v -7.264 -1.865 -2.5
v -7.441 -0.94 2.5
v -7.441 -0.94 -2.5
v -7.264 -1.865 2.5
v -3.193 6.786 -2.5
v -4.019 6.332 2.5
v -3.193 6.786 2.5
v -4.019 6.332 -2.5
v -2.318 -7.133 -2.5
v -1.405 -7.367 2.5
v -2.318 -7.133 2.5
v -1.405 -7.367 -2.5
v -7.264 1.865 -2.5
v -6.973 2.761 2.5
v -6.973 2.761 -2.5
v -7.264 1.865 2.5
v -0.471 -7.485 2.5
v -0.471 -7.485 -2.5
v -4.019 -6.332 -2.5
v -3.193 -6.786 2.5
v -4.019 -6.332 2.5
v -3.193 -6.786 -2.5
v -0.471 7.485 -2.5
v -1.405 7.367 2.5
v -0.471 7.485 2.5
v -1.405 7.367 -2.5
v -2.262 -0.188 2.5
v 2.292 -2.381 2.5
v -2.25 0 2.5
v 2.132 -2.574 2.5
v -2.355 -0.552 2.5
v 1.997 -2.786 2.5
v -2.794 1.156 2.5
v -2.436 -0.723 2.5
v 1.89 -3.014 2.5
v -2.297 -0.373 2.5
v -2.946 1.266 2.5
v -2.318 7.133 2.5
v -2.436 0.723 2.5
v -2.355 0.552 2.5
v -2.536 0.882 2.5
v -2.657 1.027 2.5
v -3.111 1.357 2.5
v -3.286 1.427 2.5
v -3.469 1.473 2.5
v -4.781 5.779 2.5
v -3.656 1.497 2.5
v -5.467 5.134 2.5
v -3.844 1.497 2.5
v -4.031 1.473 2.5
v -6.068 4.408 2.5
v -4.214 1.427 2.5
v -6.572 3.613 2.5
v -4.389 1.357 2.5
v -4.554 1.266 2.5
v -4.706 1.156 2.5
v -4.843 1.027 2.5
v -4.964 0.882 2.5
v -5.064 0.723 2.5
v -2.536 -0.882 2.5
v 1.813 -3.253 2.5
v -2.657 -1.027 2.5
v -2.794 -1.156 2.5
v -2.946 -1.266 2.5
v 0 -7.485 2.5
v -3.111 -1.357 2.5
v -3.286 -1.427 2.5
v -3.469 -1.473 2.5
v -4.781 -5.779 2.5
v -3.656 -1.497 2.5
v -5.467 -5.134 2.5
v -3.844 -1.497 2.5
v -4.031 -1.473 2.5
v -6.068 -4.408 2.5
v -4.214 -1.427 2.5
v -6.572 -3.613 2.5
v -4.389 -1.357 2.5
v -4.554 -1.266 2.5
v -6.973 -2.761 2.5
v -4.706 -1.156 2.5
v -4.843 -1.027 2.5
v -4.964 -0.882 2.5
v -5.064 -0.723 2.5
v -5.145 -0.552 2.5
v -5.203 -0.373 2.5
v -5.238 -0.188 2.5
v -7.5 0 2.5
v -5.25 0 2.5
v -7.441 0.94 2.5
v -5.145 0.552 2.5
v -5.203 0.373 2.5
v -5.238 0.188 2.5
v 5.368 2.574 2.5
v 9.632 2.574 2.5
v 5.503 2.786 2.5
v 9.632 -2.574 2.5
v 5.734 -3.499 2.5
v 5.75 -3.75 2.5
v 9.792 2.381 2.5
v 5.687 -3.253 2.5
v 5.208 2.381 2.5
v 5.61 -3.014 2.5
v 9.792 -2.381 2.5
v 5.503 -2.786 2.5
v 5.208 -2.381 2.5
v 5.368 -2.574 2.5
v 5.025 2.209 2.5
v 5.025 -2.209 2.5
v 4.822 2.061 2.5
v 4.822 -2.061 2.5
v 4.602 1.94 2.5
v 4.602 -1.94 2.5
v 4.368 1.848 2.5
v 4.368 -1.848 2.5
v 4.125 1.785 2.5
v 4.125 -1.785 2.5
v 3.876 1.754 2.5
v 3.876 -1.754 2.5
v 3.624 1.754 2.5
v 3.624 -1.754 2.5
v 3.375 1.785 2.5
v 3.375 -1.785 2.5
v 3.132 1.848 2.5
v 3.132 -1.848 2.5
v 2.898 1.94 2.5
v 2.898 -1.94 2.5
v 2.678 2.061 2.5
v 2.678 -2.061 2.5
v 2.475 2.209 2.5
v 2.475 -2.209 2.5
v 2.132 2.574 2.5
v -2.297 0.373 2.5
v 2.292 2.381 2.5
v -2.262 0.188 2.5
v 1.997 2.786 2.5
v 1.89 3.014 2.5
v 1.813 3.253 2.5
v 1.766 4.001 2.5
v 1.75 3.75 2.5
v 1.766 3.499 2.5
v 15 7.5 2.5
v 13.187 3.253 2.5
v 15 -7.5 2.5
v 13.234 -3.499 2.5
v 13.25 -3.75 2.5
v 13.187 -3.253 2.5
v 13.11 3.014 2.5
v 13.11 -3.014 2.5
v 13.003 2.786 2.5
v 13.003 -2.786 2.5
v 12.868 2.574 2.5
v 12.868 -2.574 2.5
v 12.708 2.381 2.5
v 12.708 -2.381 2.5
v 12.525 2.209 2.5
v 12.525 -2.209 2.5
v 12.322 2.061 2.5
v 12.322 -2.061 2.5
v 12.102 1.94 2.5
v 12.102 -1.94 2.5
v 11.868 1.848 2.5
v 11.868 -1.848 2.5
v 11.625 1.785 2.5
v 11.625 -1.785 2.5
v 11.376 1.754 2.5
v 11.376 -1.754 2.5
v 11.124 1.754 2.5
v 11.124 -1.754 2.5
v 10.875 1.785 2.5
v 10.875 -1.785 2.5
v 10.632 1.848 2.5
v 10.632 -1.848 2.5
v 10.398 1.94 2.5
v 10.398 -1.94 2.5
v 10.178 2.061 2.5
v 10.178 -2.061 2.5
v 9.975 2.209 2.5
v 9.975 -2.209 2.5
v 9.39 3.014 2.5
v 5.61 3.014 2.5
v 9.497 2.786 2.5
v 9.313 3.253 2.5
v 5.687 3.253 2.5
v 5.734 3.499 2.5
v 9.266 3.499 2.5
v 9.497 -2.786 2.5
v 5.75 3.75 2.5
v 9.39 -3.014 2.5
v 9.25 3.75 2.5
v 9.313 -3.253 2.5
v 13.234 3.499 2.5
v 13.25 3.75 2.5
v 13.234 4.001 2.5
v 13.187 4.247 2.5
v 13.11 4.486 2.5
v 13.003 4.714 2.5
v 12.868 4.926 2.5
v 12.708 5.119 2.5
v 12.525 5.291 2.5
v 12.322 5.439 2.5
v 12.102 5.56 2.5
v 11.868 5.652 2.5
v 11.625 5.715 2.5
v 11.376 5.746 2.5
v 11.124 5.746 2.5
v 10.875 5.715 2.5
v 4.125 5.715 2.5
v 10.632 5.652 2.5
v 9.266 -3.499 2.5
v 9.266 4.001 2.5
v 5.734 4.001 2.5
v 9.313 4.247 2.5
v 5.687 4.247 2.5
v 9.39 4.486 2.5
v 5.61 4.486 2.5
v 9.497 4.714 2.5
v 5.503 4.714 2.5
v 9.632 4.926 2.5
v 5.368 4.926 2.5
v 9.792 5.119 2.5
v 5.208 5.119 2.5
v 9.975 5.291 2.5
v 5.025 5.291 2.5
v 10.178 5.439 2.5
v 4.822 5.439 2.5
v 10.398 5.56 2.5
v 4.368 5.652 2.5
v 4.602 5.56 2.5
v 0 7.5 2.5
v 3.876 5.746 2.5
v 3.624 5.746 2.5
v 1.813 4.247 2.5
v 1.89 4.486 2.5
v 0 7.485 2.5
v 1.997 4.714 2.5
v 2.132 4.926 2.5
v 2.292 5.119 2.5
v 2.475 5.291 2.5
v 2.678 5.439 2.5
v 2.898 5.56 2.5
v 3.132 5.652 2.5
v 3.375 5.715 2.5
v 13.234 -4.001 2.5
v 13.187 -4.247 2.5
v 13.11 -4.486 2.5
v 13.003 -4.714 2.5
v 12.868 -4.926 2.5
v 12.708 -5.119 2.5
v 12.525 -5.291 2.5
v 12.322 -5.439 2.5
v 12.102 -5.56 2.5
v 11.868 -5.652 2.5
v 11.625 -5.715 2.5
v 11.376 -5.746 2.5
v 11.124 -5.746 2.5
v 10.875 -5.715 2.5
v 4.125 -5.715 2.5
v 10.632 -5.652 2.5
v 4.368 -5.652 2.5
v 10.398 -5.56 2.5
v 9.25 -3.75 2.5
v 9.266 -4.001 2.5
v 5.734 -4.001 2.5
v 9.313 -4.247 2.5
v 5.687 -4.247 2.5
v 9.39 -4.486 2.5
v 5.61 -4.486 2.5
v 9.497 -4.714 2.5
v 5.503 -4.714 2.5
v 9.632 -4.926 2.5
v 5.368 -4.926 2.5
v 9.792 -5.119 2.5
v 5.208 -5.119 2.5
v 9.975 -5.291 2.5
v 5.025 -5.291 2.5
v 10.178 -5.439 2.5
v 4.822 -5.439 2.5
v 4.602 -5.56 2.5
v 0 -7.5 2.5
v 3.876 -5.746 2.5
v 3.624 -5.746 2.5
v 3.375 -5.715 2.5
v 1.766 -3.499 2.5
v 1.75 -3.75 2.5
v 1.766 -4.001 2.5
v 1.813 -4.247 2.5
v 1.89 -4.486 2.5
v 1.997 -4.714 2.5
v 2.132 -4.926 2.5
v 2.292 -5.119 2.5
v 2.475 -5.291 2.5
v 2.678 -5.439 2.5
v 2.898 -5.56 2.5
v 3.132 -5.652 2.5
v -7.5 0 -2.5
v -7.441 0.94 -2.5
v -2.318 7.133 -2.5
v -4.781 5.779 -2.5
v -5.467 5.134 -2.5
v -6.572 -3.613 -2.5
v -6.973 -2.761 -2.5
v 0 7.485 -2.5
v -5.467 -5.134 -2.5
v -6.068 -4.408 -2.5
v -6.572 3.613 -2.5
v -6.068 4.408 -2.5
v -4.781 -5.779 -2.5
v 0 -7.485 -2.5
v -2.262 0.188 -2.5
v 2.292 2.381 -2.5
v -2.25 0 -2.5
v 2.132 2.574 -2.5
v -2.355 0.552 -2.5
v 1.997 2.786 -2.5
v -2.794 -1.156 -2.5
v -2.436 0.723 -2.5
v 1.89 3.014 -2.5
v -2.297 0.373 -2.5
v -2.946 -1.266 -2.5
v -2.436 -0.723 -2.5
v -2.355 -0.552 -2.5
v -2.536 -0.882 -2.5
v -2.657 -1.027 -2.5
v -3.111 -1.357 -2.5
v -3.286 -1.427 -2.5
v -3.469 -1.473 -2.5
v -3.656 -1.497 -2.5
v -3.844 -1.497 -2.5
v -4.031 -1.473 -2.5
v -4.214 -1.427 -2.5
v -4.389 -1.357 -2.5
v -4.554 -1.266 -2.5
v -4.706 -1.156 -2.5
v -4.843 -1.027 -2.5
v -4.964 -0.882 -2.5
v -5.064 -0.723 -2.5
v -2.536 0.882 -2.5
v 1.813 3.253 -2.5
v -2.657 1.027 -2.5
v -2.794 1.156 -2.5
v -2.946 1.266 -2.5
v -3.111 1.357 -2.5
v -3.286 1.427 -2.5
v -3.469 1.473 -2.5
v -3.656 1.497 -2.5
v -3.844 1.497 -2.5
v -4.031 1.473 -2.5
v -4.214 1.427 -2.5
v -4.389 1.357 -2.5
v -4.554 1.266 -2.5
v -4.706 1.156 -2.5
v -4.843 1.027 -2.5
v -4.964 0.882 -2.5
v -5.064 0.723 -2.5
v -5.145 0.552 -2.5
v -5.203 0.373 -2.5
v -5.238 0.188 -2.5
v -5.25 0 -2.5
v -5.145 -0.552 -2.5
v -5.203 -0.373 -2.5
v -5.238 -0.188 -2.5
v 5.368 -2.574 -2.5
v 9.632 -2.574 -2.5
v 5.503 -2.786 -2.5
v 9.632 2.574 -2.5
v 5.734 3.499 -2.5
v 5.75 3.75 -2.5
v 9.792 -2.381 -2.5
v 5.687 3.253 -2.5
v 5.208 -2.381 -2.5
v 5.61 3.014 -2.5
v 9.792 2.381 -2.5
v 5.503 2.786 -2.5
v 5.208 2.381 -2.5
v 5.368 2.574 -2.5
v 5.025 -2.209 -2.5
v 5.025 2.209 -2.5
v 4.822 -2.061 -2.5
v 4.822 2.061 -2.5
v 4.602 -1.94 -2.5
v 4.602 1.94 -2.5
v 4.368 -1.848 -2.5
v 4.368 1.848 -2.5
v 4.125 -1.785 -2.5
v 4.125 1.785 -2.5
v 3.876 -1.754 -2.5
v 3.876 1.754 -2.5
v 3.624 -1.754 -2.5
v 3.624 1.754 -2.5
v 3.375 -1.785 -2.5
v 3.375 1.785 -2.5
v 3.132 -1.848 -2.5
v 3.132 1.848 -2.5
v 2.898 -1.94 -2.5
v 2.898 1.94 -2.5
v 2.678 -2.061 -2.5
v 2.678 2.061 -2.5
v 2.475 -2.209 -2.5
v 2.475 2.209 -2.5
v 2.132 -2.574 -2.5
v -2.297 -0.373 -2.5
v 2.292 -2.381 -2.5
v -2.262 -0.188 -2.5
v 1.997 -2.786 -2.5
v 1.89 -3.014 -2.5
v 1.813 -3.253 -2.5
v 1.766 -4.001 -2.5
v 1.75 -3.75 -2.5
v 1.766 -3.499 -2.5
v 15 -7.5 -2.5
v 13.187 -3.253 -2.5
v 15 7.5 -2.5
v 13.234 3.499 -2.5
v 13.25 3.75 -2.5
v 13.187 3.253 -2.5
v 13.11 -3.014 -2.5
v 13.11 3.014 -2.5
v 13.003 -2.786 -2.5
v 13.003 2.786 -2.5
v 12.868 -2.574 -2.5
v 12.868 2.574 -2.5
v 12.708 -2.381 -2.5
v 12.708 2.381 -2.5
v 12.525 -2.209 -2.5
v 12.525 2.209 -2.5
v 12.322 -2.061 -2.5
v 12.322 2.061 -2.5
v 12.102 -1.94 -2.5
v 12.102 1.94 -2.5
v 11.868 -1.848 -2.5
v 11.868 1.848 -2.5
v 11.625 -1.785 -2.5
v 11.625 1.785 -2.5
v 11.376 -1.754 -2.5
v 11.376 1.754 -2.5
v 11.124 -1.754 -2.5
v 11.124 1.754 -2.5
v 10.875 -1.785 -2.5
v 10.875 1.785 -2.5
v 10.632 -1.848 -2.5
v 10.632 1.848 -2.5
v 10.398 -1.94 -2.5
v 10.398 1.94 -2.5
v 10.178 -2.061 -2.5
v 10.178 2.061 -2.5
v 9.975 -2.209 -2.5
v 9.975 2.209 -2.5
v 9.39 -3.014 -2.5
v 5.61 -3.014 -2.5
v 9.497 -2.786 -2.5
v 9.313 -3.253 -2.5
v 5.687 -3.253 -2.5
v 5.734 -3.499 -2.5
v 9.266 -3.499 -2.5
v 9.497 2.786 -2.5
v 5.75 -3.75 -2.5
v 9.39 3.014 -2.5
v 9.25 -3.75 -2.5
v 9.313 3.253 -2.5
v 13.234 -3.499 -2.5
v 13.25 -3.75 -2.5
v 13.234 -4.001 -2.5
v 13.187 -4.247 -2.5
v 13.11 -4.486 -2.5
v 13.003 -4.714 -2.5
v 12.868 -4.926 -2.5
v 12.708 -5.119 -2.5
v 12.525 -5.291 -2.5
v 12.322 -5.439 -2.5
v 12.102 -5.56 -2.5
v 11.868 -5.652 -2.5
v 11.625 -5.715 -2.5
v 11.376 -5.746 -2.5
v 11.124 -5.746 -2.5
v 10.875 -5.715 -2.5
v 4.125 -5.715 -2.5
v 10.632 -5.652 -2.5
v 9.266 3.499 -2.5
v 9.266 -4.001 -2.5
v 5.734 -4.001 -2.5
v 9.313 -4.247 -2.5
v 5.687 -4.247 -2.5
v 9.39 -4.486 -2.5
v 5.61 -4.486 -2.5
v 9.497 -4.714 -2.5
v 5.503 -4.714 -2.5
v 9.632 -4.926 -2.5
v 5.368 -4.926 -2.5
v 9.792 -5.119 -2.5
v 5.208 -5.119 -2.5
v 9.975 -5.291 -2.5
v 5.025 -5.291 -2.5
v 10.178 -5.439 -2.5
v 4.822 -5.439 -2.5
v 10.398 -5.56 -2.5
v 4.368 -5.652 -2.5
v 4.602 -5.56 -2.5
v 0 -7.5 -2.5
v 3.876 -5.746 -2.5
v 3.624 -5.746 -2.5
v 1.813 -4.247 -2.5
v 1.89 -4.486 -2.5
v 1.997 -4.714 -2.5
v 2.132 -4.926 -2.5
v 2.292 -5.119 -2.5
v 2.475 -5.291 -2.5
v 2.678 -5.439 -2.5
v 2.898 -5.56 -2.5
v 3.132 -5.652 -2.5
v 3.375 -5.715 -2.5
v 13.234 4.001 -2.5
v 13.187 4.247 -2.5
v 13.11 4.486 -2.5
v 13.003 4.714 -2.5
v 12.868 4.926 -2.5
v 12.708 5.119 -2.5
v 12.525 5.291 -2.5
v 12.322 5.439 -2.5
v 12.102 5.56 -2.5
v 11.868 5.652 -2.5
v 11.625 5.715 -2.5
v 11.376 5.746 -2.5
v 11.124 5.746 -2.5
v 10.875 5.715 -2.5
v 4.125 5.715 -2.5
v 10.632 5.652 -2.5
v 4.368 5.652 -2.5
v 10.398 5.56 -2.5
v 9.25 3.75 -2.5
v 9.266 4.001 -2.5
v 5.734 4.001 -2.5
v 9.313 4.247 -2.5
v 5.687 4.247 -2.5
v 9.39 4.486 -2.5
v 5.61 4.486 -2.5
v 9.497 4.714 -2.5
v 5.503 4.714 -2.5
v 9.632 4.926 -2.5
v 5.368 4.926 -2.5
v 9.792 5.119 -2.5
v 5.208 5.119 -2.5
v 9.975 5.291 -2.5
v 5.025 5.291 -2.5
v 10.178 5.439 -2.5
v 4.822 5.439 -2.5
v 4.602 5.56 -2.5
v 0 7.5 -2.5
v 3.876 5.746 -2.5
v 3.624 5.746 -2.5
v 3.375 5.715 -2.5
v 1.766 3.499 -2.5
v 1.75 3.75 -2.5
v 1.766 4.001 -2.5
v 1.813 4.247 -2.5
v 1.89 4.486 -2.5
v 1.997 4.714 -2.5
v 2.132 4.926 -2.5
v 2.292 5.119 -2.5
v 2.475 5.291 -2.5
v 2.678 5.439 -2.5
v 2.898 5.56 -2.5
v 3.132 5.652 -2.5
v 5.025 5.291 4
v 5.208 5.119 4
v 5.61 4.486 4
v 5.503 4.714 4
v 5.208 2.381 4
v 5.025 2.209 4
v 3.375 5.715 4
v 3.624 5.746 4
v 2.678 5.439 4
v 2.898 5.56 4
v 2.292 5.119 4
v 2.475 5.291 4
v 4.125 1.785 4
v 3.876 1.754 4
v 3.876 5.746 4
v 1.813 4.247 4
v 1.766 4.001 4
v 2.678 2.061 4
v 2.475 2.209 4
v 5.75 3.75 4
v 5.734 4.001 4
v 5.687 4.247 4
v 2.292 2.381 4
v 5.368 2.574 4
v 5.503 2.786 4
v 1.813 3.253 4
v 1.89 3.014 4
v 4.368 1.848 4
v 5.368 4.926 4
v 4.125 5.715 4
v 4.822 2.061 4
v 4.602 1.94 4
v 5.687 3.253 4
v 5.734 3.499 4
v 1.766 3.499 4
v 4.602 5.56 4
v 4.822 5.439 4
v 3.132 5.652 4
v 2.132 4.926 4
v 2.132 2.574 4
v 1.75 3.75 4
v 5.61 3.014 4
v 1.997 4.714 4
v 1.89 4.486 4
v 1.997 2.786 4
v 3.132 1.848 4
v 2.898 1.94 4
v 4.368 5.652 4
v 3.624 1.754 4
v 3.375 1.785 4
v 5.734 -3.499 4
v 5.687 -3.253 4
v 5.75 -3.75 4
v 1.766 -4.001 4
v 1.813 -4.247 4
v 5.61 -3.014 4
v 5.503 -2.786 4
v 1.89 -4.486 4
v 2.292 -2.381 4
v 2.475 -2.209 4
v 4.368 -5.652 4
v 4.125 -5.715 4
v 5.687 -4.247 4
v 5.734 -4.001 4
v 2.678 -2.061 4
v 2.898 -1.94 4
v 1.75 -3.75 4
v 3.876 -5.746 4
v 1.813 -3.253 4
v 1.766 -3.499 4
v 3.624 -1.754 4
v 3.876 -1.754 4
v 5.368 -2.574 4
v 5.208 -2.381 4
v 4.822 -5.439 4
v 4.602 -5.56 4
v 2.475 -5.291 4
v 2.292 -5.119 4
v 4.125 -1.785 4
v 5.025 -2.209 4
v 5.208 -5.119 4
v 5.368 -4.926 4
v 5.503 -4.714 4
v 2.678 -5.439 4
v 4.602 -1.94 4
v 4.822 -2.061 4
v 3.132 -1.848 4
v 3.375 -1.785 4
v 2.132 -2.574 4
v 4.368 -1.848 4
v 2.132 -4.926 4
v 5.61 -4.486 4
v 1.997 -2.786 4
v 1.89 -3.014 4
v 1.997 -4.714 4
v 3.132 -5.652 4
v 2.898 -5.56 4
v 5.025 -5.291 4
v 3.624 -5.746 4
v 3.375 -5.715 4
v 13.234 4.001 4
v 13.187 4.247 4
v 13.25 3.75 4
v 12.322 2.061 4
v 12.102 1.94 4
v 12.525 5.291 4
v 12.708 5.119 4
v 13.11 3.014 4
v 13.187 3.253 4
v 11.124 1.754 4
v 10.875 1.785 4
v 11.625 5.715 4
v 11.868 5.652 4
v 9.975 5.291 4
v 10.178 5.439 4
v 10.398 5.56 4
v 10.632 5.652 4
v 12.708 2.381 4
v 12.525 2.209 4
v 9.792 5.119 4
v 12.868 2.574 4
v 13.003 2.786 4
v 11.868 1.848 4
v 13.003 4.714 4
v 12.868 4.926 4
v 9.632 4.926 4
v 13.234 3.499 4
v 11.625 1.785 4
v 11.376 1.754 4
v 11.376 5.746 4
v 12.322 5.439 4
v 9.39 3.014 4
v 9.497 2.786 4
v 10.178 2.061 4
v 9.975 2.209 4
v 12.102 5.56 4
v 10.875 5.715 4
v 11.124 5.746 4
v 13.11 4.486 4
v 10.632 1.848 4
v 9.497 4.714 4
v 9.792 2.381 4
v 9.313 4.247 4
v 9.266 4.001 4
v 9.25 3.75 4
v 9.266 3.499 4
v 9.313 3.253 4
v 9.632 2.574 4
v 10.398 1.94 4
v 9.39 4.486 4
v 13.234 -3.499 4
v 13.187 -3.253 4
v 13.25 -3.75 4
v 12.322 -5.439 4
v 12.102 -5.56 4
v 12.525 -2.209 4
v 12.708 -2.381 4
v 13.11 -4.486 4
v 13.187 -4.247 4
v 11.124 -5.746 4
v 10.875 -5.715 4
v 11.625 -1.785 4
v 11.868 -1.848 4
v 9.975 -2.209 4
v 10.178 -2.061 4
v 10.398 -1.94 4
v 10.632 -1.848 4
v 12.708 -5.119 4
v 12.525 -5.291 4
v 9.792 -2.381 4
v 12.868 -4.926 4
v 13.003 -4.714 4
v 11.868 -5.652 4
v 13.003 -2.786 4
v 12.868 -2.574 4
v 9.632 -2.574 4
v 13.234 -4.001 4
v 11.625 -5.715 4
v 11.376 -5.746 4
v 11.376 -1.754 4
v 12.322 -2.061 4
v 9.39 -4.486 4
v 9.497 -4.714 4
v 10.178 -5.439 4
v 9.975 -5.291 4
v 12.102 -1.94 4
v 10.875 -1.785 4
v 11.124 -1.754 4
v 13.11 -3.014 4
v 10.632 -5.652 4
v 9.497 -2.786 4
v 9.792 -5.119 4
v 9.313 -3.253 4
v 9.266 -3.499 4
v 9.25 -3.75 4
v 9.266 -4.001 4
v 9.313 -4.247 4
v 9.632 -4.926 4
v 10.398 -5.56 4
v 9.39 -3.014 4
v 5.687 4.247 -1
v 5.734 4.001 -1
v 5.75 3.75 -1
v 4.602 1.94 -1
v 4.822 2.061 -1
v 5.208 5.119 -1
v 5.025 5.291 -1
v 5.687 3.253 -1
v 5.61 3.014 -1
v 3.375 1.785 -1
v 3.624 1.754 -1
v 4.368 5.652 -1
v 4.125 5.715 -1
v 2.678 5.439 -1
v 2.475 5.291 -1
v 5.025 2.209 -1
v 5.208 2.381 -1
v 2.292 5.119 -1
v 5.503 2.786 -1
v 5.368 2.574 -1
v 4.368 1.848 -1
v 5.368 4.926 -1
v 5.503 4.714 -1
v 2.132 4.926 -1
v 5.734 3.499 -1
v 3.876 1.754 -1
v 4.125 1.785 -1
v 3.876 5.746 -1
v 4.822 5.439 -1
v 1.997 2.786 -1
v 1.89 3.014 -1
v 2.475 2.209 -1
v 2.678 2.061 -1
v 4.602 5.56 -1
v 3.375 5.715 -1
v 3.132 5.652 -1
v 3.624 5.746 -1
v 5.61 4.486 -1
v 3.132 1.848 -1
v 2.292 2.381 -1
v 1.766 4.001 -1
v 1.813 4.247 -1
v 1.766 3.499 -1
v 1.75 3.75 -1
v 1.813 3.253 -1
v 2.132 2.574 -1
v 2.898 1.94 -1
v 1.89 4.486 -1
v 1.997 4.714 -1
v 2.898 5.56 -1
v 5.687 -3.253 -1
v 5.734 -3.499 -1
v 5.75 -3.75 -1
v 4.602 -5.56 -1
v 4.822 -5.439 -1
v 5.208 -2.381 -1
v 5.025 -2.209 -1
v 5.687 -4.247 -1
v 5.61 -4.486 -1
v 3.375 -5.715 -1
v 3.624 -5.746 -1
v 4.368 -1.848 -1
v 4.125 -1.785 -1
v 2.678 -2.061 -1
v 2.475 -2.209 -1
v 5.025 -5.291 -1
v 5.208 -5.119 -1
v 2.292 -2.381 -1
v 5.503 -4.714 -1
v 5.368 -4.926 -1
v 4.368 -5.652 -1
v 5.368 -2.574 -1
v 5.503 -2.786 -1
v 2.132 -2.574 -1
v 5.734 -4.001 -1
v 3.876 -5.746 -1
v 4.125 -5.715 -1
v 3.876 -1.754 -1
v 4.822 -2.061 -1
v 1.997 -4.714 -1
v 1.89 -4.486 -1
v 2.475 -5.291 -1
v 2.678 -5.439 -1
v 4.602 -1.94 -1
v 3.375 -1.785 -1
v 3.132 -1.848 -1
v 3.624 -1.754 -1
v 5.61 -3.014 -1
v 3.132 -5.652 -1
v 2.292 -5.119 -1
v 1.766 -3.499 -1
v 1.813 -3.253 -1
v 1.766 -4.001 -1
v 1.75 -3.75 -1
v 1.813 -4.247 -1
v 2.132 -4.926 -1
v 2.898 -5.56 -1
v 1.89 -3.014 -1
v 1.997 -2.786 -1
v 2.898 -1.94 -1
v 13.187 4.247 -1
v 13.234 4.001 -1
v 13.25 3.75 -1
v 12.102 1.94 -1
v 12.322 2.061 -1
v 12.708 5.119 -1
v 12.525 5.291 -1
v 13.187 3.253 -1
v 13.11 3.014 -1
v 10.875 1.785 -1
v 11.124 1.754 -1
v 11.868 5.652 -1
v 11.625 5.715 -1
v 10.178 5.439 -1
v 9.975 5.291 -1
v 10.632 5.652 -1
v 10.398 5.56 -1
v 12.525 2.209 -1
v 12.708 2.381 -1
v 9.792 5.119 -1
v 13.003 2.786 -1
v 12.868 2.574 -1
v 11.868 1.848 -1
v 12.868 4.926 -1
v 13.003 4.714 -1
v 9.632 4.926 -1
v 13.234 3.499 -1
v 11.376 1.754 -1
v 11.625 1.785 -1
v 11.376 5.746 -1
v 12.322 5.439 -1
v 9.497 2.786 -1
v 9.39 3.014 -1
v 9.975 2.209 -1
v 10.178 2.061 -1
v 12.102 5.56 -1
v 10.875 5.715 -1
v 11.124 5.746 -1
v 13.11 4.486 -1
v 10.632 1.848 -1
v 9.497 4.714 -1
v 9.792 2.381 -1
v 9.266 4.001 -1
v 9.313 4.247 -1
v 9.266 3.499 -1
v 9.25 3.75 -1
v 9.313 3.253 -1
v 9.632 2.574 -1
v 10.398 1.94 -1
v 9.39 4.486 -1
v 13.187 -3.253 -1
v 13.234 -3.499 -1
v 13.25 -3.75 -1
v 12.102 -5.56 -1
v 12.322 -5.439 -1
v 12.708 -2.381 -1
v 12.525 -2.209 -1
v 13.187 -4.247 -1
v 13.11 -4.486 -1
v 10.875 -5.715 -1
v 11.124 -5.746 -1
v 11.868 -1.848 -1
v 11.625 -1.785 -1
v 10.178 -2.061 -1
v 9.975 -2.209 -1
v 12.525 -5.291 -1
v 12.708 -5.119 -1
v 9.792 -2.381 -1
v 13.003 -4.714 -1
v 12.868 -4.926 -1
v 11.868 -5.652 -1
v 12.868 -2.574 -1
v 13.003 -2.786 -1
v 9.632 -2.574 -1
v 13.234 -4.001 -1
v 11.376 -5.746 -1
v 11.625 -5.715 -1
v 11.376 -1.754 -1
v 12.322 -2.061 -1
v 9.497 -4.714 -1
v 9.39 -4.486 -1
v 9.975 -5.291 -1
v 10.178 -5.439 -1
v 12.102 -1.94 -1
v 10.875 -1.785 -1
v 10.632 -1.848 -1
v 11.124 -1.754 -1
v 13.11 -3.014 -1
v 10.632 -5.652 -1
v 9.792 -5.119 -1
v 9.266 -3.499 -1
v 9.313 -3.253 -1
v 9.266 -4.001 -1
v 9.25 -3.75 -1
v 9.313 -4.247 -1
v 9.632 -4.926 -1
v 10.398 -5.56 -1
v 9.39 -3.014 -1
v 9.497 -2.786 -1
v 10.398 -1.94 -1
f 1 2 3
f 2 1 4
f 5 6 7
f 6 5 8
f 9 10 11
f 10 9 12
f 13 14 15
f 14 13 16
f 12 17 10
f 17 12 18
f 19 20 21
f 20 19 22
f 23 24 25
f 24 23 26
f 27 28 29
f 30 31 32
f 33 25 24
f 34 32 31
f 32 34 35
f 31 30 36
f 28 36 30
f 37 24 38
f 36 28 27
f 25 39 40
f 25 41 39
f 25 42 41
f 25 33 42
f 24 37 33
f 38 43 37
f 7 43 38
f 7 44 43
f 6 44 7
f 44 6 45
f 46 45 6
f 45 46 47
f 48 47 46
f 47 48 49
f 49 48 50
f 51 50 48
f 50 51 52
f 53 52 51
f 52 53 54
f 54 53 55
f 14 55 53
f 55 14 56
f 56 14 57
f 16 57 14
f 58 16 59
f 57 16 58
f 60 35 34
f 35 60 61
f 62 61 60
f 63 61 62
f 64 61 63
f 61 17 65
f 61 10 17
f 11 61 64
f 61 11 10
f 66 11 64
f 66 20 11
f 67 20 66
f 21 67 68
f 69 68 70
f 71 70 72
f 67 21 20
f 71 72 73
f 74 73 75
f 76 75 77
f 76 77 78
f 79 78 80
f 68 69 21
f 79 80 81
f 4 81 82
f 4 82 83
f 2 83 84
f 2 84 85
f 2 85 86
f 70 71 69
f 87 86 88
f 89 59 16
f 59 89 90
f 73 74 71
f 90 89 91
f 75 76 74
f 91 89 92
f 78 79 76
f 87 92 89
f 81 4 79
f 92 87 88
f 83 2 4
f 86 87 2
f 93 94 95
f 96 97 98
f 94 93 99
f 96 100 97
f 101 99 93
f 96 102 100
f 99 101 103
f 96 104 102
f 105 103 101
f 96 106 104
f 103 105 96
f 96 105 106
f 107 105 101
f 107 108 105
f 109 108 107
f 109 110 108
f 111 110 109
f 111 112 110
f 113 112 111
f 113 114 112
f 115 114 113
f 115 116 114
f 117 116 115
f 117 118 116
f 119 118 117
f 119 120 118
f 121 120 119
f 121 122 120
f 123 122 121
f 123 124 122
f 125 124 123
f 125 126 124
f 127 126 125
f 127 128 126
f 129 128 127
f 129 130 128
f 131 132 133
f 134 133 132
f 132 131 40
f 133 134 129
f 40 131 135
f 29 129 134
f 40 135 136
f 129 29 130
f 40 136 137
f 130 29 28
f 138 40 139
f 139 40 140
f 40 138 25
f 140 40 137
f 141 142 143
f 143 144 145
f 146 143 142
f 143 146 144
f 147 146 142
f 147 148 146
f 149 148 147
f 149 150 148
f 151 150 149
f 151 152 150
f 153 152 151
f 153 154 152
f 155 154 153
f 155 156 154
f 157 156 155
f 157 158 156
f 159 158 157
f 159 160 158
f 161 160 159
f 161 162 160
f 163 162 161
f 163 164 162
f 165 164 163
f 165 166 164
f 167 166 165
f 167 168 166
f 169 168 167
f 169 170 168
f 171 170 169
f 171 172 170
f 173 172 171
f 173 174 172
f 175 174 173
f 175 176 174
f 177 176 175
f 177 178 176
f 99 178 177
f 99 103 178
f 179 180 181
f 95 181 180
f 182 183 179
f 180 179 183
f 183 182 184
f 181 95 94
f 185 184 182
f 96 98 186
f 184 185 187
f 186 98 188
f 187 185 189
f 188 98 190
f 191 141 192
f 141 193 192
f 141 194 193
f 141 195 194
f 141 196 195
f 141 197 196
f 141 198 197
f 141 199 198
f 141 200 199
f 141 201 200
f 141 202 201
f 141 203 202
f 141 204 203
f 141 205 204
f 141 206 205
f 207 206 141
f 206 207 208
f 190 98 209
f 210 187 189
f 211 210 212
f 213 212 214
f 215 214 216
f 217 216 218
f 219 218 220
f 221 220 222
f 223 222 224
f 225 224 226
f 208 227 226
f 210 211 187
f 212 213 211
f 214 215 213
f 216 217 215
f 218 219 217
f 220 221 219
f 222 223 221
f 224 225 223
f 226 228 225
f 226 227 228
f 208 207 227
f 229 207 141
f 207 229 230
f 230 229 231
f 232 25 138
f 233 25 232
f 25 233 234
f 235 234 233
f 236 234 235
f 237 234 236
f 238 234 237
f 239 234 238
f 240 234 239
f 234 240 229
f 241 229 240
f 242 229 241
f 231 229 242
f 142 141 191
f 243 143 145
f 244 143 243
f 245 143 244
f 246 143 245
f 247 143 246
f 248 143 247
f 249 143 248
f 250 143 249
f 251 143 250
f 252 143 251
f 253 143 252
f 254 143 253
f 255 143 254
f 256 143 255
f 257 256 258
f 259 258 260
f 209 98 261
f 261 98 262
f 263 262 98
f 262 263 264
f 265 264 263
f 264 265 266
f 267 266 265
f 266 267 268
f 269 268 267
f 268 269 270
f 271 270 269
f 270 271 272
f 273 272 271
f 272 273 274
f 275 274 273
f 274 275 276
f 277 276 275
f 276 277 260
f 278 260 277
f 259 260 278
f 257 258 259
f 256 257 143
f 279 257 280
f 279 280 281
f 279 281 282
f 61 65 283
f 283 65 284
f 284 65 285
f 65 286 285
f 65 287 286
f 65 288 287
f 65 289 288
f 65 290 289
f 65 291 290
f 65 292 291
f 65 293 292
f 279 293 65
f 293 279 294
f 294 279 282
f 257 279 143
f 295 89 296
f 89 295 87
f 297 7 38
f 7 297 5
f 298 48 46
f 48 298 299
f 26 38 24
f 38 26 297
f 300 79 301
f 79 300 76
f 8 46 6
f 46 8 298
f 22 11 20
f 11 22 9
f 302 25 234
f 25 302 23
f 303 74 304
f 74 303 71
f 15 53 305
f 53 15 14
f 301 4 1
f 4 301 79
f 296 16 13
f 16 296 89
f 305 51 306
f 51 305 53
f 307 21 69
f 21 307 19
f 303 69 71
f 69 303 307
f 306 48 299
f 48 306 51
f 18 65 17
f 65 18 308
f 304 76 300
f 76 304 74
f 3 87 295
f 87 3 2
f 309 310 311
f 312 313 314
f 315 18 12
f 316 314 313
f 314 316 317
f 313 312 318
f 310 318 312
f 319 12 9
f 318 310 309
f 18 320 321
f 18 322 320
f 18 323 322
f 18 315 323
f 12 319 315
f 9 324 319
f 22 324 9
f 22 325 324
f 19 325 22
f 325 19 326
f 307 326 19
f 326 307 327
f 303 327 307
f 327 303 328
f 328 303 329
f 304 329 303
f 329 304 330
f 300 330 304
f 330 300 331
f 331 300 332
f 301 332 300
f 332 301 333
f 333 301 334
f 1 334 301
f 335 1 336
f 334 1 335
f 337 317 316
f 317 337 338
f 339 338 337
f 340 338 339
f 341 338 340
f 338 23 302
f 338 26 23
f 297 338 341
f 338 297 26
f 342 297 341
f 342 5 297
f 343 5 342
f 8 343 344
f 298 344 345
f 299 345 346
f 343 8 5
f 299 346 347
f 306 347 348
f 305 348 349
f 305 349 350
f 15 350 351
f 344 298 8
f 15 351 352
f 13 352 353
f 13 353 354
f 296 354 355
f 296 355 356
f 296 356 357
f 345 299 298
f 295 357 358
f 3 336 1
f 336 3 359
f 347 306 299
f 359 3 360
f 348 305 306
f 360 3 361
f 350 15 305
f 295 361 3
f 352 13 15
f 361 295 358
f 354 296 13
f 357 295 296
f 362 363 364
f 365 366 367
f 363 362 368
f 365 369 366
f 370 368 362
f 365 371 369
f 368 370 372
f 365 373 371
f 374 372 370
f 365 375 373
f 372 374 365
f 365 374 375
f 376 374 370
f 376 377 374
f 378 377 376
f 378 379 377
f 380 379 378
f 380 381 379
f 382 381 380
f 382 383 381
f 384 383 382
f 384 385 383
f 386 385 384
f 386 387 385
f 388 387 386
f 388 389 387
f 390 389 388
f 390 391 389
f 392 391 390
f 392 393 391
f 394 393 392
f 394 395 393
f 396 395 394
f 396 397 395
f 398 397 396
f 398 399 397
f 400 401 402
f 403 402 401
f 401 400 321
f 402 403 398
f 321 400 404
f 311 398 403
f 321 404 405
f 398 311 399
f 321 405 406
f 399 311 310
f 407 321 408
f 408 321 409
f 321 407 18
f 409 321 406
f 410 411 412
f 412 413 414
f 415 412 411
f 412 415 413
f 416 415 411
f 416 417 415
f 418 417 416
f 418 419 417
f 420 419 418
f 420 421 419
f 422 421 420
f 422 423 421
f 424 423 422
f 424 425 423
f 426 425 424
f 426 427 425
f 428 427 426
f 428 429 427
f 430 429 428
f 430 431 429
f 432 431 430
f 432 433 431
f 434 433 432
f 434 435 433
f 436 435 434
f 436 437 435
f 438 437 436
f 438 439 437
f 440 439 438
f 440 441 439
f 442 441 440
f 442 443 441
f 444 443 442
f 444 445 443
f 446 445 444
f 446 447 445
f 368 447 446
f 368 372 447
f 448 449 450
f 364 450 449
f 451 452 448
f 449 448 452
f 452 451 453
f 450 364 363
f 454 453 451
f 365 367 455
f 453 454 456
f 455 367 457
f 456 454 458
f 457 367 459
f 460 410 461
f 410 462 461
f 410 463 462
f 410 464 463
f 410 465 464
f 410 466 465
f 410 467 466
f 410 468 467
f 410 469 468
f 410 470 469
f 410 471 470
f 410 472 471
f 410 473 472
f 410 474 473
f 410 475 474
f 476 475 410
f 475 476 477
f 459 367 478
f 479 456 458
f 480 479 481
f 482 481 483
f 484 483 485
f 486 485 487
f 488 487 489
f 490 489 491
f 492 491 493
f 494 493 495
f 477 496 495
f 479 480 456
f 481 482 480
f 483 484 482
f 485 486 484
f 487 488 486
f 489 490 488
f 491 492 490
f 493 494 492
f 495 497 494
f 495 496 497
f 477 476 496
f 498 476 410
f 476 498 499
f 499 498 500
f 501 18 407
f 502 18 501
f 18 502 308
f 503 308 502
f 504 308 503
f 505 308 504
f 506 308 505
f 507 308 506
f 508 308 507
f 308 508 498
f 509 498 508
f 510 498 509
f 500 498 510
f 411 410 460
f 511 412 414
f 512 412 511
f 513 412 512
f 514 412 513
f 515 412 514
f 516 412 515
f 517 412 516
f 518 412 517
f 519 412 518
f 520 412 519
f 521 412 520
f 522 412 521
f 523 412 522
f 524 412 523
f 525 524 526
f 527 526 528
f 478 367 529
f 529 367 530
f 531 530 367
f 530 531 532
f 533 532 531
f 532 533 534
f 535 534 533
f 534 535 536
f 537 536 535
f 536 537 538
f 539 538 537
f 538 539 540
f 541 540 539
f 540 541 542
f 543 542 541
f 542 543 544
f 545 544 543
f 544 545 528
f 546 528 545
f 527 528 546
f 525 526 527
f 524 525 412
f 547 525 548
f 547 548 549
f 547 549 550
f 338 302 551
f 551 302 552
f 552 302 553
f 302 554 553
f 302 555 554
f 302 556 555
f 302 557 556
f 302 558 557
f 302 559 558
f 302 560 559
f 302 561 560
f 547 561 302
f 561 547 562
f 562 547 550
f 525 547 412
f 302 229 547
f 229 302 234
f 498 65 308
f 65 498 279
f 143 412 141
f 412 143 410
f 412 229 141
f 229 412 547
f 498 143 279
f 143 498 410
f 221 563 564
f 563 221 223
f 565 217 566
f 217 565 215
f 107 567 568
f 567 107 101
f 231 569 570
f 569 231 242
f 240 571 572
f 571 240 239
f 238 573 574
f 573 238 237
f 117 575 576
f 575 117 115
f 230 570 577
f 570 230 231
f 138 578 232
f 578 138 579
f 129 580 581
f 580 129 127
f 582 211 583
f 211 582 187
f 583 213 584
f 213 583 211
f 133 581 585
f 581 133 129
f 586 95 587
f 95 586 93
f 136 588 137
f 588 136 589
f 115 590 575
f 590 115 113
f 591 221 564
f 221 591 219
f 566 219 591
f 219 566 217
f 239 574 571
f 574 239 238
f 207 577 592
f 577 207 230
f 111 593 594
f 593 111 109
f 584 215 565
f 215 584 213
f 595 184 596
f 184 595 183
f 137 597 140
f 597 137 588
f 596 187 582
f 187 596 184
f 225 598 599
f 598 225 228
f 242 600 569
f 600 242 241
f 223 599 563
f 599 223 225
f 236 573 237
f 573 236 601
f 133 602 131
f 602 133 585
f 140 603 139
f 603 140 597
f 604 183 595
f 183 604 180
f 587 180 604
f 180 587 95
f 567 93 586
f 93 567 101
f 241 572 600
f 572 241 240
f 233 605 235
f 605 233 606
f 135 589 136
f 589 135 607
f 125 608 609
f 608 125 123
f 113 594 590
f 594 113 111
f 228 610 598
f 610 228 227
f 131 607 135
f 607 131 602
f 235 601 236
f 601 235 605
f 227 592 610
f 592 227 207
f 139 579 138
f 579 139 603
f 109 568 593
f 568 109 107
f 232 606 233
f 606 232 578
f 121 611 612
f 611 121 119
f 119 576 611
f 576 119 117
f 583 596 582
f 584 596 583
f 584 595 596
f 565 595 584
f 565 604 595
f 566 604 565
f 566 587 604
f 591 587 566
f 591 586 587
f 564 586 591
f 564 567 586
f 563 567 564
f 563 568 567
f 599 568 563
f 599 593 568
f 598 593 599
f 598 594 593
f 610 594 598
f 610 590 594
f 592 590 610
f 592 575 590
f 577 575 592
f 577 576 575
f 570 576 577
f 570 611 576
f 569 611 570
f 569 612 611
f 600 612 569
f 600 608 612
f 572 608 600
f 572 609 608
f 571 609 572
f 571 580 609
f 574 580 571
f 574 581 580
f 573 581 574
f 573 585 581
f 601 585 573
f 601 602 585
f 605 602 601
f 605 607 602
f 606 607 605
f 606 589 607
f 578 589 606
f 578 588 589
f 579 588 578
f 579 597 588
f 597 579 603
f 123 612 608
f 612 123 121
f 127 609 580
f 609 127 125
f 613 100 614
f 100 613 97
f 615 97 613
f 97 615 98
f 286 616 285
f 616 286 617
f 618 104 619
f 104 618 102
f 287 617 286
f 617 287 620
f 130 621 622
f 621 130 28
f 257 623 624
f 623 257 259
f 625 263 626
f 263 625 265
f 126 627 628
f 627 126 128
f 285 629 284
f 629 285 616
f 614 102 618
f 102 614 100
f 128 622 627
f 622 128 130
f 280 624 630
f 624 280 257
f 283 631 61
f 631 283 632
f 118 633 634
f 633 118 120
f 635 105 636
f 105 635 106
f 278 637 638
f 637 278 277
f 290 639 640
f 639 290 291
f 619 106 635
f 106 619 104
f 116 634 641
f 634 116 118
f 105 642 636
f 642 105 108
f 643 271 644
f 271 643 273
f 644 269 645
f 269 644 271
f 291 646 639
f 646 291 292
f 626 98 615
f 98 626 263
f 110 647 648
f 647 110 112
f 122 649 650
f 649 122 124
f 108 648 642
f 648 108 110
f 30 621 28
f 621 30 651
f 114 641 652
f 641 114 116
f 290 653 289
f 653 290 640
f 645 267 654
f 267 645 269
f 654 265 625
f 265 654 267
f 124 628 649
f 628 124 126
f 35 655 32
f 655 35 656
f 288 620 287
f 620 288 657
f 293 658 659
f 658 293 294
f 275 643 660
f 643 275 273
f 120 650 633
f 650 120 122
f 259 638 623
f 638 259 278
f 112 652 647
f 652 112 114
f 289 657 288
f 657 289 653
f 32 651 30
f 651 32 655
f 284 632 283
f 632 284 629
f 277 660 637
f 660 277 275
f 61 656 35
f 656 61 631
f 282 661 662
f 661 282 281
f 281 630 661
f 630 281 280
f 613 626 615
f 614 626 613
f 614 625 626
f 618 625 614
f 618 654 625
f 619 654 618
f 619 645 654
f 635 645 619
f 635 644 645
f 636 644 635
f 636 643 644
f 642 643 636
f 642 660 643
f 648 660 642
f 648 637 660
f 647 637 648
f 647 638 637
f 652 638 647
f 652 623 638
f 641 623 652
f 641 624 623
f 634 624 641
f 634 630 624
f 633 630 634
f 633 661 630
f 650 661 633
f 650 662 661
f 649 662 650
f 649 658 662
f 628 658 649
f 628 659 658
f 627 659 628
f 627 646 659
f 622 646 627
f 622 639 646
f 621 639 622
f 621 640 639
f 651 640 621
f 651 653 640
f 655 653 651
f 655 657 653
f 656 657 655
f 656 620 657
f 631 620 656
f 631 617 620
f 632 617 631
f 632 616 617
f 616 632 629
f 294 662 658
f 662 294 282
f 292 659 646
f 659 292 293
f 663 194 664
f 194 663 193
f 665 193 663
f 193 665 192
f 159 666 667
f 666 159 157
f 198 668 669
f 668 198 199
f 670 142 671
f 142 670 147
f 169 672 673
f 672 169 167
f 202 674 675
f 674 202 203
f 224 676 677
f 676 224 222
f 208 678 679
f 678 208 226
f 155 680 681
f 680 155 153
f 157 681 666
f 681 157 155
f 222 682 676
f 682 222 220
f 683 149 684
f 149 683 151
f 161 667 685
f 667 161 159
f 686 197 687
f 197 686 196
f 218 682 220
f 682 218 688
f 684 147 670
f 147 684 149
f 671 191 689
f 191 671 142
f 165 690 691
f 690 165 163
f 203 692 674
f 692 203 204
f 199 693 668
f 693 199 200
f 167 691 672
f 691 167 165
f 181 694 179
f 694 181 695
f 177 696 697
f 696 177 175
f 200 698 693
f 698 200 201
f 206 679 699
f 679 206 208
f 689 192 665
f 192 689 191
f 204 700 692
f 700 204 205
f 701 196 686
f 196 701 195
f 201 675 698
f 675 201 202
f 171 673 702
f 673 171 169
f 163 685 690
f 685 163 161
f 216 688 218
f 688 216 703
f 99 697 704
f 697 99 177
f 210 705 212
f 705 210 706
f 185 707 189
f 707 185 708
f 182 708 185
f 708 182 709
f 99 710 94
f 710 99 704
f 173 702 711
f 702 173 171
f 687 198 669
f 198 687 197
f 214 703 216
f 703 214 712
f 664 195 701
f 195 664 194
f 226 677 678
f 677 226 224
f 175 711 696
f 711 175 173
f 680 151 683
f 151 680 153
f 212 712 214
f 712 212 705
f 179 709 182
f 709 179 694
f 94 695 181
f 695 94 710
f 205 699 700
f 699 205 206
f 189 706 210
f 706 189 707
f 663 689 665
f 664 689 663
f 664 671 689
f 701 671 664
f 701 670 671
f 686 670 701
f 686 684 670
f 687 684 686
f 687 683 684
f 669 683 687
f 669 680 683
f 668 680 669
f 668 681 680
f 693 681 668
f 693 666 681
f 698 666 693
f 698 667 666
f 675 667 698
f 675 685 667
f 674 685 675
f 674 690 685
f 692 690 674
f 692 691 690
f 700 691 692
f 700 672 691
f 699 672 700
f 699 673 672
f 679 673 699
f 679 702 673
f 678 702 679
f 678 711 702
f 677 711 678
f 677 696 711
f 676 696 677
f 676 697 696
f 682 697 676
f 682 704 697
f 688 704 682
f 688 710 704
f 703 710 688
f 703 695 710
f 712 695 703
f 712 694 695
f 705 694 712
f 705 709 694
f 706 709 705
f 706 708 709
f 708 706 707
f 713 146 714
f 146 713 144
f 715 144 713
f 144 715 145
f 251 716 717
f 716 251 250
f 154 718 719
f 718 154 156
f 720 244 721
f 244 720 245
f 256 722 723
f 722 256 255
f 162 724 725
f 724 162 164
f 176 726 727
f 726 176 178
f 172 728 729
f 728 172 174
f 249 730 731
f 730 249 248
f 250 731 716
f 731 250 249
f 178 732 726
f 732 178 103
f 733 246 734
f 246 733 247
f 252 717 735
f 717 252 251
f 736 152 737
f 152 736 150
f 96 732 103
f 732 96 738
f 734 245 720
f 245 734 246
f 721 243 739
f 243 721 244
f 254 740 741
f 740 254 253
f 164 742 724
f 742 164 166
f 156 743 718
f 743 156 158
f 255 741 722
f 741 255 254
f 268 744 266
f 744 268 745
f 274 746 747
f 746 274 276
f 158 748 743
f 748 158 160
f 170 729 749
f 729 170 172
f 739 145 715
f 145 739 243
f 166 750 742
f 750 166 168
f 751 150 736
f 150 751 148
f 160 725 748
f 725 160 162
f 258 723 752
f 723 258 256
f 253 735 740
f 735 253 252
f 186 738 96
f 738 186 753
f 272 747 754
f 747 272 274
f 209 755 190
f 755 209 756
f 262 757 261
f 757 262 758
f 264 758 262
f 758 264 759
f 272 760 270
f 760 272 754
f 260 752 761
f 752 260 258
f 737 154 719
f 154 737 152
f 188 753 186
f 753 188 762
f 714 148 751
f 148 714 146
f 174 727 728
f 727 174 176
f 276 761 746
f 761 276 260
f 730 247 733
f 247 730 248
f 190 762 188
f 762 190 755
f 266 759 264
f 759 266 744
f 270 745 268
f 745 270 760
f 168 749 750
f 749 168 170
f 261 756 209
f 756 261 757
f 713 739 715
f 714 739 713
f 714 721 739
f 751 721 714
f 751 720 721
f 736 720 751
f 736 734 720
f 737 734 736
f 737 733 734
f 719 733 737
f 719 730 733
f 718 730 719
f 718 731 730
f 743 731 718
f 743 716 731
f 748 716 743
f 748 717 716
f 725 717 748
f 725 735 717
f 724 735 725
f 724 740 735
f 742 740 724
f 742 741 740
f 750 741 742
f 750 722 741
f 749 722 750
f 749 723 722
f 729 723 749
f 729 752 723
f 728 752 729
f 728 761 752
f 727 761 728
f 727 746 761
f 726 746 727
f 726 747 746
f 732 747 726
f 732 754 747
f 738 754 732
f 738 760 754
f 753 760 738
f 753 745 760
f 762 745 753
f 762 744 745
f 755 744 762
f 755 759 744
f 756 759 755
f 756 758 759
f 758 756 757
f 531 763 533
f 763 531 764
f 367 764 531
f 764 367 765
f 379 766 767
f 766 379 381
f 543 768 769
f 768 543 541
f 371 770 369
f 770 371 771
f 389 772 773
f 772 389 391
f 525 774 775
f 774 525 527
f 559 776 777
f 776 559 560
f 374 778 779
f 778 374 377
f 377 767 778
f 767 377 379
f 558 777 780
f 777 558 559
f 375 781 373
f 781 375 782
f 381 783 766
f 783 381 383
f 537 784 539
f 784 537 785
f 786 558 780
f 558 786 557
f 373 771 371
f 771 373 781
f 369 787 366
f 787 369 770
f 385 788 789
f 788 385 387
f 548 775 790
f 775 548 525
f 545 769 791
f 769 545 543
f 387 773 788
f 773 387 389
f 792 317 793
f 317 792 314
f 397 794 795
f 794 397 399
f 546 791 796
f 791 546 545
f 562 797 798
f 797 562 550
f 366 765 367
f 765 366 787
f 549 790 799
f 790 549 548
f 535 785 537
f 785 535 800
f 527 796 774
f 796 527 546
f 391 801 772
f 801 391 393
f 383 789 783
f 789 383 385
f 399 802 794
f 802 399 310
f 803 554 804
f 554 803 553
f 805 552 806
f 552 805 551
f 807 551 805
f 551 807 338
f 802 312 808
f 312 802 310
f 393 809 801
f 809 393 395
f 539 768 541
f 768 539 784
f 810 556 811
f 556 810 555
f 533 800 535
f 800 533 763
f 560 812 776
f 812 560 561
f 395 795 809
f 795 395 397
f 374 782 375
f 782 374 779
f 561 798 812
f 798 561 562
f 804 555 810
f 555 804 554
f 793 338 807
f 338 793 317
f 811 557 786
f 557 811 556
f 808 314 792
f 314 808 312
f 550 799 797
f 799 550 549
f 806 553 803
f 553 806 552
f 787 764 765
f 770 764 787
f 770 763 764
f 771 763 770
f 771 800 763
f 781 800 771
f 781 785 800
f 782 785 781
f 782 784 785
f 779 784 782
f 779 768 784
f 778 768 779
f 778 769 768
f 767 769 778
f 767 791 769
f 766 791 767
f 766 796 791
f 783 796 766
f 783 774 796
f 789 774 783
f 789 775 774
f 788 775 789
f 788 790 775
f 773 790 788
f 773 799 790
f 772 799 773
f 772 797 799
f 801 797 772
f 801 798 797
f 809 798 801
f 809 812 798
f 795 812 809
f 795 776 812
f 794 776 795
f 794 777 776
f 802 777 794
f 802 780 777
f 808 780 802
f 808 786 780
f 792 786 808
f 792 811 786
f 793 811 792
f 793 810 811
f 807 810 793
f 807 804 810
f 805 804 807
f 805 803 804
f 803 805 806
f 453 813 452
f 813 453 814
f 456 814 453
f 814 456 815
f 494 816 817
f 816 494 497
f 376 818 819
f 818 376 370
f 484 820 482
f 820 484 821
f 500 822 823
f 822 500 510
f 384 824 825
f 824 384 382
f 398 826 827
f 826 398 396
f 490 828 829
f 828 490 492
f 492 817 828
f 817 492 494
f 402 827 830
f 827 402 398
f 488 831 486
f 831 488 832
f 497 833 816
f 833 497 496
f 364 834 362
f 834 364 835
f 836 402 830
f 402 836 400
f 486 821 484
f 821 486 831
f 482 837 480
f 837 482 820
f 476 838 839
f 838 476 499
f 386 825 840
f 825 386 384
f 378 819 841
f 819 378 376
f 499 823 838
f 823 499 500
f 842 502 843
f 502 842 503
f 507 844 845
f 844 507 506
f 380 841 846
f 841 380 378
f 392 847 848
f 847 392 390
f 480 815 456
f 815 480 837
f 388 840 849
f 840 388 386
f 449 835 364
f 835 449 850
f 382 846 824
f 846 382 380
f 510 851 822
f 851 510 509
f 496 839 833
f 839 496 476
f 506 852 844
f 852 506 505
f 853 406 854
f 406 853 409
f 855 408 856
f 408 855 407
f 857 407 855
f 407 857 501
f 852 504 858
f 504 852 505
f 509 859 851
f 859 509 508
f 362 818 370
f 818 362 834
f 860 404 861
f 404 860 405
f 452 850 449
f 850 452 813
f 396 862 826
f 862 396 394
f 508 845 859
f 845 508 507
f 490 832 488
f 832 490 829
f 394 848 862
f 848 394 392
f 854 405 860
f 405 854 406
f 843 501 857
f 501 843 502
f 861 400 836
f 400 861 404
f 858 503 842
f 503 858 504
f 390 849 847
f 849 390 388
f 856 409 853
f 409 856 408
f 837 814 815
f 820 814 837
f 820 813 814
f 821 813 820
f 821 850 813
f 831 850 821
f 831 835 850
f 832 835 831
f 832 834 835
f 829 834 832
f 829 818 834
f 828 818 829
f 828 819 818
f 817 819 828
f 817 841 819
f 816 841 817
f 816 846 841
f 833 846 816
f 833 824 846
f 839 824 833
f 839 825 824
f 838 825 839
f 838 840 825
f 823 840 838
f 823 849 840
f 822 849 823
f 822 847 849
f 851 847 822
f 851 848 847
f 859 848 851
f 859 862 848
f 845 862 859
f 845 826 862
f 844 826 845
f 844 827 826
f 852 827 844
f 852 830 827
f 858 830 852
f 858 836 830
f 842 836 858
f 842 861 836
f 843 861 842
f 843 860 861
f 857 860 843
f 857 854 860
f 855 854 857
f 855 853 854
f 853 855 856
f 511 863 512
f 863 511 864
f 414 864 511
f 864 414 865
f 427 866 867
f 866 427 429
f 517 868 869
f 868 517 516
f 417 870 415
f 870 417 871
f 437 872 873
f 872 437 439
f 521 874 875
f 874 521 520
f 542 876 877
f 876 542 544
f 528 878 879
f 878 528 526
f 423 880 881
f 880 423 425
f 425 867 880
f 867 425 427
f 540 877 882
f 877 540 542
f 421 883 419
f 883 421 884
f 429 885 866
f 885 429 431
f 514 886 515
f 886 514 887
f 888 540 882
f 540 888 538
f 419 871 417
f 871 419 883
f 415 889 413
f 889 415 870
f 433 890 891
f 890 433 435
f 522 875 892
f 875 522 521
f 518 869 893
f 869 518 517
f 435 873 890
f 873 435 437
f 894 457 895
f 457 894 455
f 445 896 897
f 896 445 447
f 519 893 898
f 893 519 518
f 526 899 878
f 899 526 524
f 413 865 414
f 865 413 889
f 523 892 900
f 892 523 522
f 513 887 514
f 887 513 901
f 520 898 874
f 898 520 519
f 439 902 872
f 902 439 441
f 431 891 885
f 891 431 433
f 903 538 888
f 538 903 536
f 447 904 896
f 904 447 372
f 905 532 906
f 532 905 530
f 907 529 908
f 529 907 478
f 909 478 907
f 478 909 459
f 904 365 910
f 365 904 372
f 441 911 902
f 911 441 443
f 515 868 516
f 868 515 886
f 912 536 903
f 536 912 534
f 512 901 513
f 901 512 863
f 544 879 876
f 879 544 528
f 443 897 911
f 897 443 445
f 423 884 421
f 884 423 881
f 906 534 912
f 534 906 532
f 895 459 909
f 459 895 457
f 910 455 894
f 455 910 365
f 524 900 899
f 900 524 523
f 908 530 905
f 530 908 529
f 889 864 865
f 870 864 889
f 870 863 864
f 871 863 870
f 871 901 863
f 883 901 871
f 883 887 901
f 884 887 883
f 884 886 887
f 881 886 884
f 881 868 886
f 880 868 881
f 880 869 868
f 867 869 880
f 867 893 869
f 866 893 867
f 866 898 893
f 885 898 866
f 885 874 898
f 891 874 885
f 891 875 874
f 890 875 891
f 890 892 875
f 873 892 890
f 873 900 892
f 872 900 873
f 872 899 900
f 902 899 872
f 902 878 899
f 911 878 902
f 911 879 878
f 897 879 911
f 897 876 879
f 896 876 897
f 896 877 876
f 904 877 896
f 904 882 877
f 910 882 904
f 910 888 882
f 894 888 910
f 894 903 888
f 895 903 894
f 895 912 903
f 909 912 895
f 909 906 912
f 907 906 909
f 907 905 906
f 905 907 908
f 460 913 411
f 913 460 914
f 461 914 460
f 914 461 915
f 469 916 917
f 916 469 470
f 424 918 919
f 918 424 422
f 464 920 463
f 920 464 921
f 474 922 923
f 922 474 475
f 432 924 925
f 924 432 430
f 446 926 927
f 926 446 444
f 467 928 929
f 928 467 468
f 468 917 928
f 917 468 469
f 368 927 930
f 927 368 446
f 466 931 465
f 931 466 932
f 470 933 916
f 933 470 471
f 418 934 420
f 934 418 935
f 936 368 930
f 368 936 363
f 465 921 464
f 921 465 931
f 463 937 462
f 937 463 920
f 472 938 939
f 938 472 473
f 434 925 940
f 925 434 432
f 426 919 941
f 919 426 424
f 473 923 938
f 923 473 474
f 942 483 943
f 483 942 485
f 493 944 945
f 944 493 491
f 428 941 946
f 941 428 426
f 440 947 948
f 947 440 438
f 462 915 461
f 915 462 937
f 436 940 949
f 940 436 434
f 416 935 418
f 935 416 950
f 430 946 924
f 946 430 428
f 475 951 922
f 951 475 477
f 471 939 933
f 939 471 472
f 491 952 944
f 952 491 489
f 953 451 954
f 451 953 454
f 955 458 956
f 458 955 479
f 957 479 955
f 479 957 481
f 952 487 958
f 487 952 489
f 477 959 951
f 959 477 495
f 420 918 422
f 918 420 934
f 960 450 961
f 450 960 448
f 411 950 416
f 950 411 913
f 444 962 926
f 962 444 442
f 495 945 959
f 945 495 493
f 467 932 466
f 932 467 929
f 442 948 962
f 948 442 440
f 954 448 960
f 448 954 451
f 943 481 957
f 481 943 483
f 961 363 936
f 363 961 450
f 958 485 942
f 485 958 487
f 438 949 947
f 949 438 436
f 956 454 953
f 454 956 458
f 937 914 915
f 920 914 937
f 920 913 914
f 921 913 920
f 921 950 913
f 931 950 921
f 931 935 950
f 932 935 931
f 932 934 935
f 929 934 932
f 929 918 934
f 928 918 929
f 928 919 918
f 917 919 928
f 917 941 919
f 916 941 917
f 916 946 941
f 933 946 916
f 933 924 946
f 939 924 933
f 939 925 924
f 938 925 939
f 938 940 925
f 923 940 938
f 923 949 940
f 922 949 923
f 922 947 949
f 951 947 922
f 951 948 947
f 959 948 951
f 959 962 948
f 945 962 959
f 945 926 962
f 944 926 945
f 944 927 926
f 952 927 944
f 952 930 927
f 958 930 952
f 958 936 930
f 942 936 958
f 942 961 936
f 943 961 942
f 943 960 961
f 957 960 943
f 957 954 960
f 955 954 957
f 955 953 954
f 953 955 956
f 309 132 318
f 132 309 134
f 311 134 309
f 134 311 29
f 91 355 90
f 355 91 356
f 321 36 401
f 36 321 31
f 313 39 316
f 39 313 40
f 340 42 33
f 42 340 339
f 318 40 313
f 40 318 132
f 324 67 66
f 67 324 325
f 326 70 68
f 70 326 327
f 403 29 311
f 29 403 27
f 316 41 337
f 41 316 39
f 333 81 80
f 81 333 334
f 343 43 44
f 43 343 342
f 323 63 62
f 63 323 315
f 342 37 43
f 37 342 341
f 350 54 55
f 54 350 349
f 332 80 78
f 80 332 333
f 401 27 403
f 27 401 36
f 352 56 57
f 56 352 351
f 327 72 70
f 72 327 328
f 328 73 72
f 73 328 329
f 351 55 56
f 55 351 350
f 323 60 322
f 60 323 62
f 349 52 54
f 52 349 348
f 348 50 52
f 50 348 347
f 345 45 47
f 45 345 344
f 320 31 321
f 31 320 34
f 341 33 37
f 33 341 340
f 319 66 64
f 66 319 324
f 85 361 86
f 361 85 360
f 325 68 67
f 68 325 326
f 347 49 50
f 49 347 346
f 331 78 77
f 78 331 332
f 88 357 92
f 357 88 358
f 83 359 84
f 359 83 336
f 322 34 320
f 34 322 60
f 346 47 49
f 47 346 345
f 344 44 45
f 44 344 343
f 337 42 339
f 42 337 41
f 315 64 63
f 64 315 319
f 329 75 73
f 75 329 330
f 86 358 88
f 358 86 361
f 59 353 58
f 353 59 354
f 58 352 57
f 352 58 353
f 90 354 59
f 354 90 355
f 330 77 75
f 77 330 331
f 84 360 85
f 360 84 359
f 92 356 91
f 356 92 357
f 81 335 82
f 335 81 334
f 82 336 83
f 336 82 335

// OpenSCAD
// [FL_INDEX: keywords="openscad, 3d_parametric, Lego_Heart, csg_solid" | COT="Parametric OpenSCAD design from 3DCodeverse"]
// Title: Lego Heart

//Size on the y-Axis in mm
size = 15;

//Size on the z-Axis in mm
height = 5;

module half(){
	difference(){
		cylinder(r=size/2,h=height,$fn=50, center=true);
		translate([(size+1)/2,0,0]) cube([size + 1, size + 1,height + 1],center = true);
	}
}

module plate(){
	union() {
		half();
		translate([0,-size/2,-height/2]) cube([size,size,height]);
	}
}

//Top Knob Diameter
knob_diameter = 4;

//Top Knob Hight
knob_hight = 1.5;

//Bottom Hole Diameter
hole_diameter = 4;

//Bottom Hole Depth
hole_depth = 1.5;

//Keyring Hole Diameter
keyring_hole=1.5;

difference(){
	union(){
		plate();
		translate([size/4, size/4 , height/2]) cylinder(r=knob_diameter/2,h=knob_hight,$fn=50);
		translate([size/4, -size/4, height/2]) cylinder(r=knob_diameter/2,h=knob_hight,$fn=50);
		translate([3*(size/4), size/4, height/2]) cylinder(r=knob_diameter/2,h=knob_hight,$fn=50);
		translate([3*(size/4),-size/4, height/2]) cylinder(r=knob_diameter/2,h=knob_hight,$fn=50);
	}
	translate([size/4,size/4,-height/2-0.01]) cylinder(r=hole_diameter/2,h=hole_depth+0.01,$fn=50);
	translate([size/4,-size/4,-height/2-0.01]) cylinder(r=hole_diameter/2,h=hole_depth+0.01,$fn=50);
	translate([3*(size/4),size/4,-height/2-0.01]) cylinder(r=hole_diameter/2,h=hole_depth+0.01,$fn=50);
	translate([3*(size/4),-size/4,-height/2-0.01]) cylinder(r=hole_diameter/2,h=hole_depth+0.01,$fn=50);
	translate([-size/4,0,-height/2-0.01]) cylinder(r=keyring_hole, h=height+0.02, $fn=50);
}
